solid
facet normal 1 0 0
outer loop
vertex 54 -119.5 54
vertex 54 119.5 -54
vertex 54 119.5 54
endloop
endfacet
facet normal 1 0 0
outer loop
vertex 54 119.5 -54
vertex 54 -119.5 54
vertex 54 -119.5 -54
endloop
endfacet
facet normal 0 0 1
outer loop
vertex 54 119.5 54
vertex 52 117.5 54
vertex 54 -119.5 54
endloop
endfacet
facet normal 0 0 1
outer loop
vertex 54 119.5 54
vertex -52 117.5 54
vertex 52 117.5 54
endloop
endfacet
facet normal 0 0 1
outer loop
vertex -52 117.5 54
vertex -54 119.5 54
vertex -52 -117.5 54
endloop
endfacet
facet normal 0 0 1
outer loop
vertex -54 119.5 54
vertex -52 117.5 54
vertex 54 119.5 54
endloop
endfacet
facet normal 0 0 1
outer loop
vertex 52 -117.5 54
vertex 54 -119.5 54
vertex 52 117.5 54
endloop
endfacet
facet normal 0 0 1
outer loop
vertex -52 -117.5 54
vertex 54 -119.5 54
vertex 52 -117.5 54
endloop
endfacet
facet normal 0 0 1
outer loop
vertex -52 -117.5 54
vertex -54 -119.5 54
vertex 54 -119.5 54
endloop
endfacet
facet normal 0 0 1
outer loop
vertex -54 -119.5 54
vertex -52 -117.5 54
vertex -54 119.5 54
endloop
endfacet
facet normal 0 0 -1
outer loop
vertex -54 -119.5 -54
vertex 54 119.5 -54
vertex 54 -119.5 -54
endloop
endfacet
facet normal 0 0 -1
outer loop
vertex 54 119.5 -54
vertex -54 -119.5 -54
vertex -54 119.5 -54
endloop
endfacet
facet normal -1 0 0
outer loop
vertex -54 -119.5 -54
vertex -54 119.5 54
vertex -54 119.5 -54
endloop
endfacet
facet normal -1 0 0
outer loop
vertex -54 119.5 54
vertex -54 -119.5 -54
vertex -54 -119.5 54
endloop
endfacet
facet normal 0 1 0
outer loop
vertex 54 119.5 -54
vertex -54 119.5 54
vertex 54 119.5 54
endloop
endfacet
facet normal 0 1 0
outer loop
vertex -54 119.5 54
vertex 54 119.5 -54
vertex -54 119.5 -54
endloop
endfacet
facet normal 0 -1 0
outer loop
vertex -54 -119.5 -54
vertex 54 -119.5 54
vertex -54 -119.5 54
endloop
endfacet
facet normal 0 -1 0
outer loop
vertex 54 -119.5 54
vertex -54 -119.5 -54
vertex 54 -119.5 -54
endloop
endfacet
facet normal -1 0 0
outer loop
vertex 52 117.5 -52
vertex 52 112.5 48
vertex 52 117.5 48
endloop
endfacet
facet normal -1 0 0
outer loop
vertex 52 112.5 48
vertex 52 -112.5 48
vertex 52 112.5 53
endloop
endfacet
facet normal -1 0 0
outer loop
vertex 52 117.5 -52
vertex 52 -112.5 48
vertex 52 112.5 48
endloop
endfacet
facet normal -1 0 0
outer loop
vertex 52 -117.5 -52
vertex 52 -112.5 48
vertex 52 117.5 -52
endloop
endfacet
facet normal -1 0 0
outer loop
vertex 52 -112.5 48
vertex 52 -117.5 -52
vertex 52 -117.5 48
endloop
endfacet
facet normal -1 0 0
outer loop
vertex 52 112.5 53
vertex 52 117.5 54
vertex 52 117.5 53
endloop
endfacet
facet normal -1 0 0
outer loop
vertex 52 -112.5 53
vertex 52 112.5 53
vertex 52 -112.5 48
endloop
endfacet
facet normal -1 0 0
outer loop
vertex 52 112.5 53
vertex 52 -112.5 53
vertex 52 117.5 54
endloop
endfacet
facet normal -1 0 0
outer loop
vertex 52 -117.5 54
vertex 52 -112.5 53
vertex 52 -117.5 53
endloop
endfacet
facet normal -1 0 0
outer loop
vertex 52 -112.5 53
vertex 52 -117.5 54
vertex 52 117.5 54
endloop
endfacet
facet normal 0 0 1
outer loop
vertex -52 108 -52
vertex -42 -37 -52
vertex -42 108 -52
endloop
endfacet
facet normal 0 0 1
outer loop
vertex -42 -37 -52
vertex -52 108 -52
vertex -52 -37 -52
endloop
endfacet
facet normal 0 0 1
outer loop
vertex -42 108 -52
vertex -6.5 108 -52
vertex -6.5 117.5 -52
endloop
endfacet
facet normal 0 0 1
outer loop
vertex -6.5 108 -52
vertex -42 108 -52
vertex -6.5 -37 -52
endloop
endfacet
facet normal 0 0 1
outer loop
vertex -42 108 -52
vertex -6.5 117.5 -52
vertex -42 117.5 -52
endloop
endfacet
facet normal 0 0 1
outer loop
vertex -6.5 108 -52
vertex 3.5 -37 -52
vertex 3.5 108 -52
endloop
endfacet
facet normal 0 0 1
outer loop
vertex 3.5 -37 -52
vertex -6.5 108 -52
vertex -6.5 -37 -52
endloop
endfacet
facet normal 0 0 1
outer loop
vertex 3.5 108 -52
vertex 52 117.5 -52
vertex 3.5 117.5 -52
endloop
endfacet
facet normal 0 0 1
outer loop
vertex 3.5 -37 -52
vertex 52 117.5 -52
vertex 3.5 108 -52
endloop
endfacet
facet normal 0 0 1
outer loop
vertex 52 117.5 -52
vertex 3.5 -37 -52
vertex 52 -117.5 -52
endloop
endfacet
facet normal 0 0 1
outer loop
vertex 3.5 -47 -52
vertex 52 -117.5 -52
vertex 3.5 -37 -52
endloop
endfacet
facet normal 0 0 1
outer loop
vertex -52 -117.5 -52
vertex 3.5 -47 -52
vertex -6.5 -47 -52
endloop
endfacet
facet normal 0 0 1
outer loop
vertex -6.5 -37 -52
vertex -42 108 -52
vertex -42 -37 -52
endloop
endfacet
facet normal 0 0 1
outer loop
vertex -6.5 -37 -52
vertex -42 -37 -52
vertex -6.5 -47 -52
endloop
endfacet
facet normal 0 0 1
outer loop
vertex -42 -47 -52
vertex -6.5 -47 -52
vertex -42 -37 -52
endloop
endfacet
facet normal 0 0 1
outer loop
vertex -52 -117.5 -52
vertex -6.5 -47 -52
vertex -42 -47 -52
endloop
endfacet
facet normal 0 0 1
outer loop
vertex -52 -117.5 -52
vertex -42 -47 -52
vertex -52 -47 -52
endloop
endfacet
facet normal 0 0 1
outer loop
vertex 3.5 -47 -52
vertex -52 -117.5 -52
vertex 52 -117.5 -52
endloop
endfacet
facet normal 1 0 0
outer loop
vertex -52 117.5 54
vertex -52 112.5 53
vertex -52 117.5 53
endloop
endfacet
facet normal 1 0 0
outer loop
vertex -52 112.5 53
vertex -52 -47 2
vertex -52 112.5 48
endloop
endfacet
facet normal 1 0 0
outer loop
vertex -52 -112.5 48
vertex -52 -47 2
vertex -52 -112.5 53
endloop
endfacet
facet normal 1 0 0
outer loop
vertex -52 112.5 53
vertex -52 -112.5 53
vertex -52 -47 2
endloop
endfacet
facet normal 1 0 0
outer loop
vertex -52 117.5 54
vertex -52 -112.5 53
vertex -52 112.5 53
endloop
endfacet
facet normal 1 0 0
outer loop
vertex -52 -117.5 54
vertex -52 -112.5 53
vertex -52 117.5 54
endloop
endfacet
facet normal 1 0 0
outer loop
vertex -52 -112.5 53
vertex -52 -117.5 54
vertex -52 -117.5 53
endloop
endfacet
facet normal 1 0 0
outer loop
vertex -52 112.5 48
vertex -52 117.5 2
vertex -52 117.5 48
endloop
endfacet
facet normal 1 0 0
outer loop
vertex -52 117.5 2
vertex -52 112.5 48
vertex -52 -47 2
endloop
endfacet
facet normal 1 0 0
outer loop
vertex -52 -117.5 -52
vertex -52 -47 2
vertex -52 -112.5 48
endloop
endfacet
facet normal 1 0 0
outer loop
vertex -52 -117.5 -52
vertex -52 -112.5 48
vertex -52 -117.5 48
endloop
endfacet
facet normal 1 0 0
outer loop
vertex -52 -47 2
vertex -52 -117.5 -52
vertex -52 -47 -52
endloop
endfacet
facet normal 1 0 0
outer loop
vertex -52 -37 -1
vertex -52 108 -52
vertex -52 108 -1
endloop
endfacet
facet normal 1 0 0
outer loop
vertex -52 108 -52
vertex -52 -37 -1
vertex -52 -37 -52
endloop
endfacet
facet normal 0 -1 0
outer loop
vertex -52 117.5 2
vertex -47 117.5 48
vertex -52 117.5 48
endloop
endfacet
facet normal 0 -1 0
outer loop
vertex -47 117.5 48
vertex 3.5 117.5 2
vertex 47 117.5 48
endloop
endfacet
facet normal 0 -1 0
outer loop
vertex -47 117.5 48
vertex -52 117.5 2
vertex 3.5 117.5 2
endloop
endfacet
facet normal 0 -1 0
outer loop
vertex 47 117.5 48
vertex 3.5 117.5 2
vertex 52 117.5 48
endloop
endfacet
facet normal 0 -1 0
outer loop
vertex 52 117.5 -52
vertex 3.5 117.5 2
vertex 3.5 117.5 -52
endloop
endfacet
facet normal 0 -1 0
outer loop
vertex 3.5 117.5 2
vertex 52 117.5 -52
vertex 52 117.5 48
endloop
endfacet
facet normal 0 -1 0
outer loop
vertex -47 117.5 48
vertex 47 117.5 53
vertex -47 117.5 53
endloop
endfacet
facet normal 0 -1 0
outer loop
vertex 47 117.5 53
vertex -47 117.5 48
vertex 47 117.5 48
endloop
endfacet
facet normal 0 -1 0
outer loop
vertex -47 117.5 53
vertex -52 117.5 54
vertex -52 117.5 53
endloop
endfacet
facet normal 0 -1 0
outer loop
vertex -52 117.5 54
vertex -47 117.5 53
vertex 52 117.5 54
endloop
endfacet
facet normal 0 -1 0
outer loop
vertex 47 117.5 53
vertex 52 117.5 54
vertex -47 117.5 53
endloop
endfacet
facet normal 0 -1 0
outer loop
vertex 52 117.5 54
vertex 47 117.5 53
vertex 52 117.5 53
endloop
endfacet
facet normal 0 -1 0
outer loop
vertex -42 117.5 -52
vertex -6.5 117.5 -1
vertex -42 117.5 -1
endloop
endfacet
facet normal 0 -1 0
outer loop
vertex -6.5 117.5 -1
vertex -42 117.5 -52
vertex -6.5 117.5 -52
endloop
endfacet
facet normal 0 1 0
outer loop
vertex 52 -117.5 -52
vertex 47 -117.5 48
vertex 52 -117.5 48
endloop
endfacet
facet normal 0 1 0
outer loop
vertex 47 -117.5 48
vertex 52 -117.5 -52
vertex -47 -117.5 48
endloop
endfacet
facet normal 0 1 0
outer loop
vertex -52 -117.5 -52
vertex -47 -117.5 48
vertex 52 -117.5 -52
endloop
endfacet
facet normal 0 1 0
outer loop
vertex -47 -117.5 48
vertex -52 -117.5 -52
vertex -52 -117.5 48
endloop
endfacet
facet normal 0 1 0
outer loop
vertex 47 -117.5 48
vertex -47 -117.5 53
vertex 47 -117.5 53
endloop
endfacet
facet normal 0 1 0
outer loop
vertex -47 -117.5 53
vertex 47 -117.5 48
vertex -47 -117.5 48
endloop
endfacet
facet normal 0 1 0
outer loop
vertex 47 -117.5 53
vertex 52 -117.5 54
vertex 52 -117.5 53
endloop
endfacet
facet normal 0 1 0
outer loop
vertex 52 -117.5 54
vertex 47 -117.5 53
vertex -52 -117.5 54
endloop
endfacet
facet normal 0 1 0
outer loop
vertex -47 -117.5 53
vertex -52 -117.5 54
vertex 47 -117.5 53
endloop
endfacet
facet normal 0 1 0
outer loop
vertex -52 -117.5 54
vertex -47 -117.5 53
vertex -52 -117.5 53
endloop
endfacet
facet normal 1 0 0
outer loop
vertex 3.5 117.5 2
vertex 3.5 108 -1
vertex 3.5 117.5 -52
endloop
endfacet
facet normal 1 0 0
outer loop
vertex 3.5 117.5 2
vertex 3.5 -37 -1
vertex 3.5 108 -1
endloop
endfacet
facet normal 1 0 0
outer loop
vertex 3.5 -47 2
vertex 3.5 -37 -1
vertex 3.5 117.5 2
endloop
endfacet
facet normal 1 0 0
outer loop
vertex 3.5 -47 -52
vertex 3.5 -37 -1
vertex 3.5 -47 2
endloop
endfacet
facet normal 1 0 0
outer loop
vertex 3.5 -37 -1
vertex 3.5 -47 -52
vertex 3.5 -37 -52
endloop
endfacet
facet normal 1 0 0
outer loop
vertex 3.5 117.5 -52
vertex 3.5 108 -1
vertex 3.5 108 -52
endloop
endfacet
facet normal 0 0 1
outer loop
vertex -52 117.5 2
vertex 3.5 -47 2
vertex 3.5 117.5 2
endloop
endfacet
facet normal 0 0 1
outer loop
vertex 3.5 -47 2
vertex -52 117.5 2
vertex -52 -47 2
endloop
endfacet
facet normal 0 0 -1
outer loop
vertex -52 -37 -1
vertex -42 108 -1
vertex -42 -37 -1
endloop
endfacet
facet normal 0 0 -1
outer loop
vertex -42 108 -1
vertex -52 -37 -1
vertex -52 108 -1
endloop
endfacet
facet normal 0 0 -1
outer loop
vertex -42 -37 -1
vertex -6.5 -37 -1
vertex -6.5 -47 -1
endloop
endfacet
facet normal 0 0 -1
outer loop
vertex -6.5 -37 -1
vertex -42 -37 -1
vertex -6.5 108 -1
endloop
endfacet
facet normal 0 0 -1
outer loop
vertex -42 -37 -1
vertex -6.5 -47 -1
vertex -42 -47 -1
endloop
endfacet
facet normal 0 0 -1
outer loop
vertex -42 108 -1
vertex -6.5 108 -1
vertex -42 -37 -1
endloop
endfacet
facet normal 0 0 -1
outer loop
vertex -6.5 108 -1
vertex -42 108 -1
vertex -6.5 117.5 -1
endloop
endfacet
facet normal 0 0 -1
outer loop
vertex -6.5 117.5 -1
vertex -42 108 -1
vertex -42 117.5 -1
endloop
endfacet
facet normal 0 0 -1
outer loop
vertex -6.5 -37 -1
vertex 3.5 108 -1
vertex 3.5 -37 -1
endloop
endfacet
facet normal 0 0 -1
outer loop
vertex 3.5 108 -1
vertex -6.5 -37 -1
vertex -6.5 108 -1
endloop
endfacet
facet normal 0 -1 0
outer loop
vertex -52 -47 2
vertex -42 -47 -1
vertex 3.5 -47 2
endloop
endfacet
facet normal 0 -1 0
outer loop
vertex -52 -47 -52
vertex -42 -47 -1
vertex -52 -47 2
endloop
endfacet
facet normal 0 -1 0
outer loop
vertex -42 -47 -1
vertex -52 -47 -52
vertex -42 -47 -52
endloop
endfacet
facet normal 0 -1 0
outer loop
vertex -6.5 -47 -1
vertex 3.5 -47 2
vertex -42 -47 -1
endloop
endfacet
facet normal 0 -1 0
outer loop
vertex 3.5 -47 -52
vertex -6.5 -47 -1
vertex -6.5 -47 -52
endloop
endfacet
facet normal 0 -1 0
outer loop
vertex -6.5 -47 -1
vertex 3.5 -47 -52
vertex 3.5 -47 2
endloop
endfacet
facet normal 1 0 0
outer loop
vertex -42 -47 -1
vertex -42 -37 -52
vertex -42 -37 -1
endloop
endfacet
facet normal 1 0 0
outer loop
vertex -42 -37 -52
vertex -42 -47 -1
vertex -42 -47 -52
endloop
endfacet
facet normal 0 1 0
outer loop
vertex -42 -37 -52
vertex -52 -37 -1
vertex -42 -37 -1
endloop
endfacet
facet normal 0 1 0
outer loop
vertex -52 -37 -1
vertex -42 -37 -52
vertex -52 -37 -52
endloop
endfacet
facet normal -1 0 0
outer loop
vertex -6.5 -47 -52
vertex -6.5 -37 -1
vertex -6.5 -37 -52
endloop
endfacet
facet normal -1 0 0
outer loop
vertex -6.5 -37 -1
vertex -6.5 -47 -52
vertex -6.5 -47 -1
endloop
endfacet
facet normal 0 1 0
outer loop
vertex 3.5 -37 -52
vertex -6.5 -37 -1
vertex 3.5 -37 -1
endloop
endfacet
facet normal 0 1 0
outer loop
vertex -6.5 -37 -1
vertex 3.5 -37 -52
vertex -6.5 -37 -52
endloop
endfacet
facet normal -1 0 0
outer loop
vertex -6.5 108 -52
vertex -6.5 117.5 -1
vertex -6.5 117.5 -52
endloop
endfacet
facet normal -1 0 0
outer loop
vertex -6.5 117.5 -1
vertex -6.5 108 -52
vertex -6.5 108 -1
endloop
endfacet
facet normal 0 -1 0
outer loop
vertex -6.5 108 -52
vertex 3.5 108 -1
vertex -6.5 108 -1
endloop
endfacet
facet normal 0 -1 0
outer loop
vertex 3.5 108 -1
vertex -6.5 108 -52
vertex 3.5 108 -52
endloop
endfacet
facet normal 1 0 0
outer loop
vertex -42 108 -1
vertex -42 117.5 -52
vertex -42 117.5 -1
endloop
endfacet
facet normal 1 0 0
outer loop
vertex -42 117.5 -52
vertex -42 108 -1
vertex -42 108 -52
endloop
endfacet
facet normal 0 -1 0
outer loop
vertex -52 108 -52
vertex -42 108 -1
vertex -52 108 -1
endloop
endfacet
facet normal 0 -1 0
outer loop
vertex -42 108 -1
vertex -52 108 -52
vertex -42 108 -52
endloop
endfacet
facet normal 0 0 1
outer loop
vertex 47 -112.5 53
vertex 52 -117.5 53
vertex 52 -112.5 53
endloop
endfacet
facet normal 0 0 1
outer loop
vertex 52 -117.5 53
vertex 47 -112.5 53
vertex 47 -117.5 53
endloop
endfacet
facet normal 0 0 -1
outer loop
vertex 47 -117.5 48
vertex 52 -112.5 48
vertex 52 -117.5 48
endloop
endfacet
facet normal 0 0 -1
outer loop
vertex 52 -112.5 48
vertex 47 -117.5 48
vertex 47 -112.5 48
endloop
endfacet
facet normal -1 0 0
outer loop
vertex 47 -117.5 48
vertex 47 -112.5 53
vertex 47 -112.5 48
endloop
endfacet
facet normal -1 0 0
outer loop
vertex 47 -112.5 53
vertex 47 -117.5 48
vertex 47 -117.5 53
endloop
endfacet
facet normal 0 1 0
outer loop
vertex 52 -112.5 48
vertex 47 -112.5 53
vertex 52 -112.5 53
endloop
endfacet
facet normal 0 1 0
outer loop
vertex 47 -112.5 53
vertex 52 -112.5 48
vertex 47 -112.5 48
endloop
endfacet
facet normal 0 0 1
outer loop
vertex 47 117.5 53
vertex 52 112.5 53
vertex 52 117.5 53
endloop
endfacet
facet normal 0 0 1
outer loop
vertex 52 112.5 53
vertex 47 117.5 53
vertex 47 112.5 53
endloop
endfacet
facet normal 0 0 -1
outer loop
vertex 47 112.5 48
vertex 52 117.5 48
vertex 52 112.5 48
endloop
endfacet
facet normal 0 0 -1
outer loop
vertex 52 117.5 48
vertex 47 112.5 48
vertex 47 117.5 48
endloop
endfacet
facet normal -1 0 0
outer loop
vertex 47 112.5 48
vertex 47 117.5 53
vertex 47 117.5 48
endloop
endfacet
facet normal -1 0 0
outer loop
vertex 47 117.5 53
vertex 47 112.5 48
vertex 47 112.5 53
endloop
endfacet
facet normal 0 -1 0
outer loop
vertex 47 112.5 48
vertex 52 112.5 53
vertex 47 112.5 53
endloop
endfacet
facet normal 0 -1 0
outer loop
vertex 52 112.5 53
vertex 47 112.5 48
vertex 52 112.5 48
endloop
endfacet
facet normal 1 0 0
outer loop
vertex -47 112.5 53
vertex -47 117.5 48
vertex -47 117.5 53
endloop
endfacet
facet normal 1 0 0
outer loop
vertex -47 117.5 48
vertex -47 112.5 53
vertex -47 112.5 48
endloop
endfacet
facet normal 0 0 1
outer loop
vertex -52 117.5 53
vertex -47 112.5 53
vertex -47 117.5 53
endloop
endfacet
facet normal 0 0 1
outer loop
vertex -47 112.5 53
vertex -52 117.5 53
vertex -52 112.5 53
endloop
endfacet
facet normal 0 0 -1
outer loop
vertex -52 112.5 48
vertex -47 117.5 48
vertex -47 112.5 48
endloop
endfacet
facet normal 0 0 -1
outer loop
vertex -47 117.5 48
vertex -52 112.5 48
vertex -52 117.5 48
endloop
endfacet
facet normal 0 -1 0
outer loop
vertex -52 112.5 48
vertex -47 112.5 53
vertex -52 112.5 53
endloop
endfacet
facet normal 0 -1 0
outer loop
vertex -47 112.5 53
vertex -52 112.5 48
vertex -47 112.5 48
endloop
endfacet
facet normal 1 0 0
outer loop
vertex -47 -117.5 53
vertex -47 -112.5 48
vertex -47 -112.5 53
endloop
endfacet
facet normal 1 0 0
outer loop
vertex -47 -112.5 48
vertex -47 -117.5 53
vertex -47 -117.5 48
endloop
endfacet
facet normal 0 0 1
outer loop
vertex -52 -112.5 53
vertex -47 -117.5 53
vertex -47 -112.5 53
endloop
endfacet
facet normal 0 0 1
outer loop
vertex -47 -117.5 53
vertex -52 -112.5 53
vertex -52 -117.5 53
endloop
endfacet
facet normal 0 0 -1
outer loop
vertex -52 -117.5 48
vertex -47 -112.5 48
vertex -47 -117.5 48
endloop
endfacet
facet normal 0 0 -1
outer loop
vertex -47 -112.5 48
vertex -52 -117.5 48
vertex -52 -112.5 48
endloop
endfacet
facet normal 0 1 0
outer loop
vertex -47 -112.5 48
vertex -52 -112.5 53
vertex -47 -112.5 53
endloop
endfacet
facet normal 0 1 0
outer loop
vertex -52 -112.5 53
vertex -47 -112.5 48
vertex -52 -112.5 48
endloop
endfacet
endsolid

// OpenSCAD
$fn = 90;

x = 108; //width of the box
y = 239; //length of the box
z = 108; //height of the box - temporary

difference(){
cube([x,y,z], center = true);

translate([0,0,1]){ 
cube ([x-4,y-4,z-2], center = true);
}
}

translate([-52,-47,-1]){
 cube([55.5,164.5,3]);  //board = 54.5 * 163.5
}

//column to hold under the board - avoid hard pressing
translate([-52,-47,-52]){
cube([10,10,51]);}

translate([-6.5,-47,-52]){
cube([10,10,51]);}

translate([-6.5,108,-52]){
cube([10,10,51]);}

translate([-52,108,-52]){
cube([10,10,51]);}
/*
translate([2.5,-47,0]){
cube([1,164.5,1]);     //horizontal wall of board
}

translate([-52,-47,0]){
cube([54.5,1,1]);      //vertical wall of board
}
////////////////////////////////////////////////////////
translate([35,-92,-52]){
 cube([17,1,50]);     //vertical wall of battery
}

translate([35,-117.5,-52]){
cube([1,25.5,25]);      //horizontal wall of battery
}
*/
////////////////////////////////////////////////////////
//start of the basic drill
h_of_drill = 48;
translate([47,-117.5,h_of_drill]){      
cube([5,5,5]);}

translate([47,112.5,h_of_drill]){
cube([5,5,5]);}

translate([-52,112.5,h_of_drill]){
cube([5,5,5]);}

translate([-52,-117.5,h_of_drill]){
cube([5,5,5]);}
